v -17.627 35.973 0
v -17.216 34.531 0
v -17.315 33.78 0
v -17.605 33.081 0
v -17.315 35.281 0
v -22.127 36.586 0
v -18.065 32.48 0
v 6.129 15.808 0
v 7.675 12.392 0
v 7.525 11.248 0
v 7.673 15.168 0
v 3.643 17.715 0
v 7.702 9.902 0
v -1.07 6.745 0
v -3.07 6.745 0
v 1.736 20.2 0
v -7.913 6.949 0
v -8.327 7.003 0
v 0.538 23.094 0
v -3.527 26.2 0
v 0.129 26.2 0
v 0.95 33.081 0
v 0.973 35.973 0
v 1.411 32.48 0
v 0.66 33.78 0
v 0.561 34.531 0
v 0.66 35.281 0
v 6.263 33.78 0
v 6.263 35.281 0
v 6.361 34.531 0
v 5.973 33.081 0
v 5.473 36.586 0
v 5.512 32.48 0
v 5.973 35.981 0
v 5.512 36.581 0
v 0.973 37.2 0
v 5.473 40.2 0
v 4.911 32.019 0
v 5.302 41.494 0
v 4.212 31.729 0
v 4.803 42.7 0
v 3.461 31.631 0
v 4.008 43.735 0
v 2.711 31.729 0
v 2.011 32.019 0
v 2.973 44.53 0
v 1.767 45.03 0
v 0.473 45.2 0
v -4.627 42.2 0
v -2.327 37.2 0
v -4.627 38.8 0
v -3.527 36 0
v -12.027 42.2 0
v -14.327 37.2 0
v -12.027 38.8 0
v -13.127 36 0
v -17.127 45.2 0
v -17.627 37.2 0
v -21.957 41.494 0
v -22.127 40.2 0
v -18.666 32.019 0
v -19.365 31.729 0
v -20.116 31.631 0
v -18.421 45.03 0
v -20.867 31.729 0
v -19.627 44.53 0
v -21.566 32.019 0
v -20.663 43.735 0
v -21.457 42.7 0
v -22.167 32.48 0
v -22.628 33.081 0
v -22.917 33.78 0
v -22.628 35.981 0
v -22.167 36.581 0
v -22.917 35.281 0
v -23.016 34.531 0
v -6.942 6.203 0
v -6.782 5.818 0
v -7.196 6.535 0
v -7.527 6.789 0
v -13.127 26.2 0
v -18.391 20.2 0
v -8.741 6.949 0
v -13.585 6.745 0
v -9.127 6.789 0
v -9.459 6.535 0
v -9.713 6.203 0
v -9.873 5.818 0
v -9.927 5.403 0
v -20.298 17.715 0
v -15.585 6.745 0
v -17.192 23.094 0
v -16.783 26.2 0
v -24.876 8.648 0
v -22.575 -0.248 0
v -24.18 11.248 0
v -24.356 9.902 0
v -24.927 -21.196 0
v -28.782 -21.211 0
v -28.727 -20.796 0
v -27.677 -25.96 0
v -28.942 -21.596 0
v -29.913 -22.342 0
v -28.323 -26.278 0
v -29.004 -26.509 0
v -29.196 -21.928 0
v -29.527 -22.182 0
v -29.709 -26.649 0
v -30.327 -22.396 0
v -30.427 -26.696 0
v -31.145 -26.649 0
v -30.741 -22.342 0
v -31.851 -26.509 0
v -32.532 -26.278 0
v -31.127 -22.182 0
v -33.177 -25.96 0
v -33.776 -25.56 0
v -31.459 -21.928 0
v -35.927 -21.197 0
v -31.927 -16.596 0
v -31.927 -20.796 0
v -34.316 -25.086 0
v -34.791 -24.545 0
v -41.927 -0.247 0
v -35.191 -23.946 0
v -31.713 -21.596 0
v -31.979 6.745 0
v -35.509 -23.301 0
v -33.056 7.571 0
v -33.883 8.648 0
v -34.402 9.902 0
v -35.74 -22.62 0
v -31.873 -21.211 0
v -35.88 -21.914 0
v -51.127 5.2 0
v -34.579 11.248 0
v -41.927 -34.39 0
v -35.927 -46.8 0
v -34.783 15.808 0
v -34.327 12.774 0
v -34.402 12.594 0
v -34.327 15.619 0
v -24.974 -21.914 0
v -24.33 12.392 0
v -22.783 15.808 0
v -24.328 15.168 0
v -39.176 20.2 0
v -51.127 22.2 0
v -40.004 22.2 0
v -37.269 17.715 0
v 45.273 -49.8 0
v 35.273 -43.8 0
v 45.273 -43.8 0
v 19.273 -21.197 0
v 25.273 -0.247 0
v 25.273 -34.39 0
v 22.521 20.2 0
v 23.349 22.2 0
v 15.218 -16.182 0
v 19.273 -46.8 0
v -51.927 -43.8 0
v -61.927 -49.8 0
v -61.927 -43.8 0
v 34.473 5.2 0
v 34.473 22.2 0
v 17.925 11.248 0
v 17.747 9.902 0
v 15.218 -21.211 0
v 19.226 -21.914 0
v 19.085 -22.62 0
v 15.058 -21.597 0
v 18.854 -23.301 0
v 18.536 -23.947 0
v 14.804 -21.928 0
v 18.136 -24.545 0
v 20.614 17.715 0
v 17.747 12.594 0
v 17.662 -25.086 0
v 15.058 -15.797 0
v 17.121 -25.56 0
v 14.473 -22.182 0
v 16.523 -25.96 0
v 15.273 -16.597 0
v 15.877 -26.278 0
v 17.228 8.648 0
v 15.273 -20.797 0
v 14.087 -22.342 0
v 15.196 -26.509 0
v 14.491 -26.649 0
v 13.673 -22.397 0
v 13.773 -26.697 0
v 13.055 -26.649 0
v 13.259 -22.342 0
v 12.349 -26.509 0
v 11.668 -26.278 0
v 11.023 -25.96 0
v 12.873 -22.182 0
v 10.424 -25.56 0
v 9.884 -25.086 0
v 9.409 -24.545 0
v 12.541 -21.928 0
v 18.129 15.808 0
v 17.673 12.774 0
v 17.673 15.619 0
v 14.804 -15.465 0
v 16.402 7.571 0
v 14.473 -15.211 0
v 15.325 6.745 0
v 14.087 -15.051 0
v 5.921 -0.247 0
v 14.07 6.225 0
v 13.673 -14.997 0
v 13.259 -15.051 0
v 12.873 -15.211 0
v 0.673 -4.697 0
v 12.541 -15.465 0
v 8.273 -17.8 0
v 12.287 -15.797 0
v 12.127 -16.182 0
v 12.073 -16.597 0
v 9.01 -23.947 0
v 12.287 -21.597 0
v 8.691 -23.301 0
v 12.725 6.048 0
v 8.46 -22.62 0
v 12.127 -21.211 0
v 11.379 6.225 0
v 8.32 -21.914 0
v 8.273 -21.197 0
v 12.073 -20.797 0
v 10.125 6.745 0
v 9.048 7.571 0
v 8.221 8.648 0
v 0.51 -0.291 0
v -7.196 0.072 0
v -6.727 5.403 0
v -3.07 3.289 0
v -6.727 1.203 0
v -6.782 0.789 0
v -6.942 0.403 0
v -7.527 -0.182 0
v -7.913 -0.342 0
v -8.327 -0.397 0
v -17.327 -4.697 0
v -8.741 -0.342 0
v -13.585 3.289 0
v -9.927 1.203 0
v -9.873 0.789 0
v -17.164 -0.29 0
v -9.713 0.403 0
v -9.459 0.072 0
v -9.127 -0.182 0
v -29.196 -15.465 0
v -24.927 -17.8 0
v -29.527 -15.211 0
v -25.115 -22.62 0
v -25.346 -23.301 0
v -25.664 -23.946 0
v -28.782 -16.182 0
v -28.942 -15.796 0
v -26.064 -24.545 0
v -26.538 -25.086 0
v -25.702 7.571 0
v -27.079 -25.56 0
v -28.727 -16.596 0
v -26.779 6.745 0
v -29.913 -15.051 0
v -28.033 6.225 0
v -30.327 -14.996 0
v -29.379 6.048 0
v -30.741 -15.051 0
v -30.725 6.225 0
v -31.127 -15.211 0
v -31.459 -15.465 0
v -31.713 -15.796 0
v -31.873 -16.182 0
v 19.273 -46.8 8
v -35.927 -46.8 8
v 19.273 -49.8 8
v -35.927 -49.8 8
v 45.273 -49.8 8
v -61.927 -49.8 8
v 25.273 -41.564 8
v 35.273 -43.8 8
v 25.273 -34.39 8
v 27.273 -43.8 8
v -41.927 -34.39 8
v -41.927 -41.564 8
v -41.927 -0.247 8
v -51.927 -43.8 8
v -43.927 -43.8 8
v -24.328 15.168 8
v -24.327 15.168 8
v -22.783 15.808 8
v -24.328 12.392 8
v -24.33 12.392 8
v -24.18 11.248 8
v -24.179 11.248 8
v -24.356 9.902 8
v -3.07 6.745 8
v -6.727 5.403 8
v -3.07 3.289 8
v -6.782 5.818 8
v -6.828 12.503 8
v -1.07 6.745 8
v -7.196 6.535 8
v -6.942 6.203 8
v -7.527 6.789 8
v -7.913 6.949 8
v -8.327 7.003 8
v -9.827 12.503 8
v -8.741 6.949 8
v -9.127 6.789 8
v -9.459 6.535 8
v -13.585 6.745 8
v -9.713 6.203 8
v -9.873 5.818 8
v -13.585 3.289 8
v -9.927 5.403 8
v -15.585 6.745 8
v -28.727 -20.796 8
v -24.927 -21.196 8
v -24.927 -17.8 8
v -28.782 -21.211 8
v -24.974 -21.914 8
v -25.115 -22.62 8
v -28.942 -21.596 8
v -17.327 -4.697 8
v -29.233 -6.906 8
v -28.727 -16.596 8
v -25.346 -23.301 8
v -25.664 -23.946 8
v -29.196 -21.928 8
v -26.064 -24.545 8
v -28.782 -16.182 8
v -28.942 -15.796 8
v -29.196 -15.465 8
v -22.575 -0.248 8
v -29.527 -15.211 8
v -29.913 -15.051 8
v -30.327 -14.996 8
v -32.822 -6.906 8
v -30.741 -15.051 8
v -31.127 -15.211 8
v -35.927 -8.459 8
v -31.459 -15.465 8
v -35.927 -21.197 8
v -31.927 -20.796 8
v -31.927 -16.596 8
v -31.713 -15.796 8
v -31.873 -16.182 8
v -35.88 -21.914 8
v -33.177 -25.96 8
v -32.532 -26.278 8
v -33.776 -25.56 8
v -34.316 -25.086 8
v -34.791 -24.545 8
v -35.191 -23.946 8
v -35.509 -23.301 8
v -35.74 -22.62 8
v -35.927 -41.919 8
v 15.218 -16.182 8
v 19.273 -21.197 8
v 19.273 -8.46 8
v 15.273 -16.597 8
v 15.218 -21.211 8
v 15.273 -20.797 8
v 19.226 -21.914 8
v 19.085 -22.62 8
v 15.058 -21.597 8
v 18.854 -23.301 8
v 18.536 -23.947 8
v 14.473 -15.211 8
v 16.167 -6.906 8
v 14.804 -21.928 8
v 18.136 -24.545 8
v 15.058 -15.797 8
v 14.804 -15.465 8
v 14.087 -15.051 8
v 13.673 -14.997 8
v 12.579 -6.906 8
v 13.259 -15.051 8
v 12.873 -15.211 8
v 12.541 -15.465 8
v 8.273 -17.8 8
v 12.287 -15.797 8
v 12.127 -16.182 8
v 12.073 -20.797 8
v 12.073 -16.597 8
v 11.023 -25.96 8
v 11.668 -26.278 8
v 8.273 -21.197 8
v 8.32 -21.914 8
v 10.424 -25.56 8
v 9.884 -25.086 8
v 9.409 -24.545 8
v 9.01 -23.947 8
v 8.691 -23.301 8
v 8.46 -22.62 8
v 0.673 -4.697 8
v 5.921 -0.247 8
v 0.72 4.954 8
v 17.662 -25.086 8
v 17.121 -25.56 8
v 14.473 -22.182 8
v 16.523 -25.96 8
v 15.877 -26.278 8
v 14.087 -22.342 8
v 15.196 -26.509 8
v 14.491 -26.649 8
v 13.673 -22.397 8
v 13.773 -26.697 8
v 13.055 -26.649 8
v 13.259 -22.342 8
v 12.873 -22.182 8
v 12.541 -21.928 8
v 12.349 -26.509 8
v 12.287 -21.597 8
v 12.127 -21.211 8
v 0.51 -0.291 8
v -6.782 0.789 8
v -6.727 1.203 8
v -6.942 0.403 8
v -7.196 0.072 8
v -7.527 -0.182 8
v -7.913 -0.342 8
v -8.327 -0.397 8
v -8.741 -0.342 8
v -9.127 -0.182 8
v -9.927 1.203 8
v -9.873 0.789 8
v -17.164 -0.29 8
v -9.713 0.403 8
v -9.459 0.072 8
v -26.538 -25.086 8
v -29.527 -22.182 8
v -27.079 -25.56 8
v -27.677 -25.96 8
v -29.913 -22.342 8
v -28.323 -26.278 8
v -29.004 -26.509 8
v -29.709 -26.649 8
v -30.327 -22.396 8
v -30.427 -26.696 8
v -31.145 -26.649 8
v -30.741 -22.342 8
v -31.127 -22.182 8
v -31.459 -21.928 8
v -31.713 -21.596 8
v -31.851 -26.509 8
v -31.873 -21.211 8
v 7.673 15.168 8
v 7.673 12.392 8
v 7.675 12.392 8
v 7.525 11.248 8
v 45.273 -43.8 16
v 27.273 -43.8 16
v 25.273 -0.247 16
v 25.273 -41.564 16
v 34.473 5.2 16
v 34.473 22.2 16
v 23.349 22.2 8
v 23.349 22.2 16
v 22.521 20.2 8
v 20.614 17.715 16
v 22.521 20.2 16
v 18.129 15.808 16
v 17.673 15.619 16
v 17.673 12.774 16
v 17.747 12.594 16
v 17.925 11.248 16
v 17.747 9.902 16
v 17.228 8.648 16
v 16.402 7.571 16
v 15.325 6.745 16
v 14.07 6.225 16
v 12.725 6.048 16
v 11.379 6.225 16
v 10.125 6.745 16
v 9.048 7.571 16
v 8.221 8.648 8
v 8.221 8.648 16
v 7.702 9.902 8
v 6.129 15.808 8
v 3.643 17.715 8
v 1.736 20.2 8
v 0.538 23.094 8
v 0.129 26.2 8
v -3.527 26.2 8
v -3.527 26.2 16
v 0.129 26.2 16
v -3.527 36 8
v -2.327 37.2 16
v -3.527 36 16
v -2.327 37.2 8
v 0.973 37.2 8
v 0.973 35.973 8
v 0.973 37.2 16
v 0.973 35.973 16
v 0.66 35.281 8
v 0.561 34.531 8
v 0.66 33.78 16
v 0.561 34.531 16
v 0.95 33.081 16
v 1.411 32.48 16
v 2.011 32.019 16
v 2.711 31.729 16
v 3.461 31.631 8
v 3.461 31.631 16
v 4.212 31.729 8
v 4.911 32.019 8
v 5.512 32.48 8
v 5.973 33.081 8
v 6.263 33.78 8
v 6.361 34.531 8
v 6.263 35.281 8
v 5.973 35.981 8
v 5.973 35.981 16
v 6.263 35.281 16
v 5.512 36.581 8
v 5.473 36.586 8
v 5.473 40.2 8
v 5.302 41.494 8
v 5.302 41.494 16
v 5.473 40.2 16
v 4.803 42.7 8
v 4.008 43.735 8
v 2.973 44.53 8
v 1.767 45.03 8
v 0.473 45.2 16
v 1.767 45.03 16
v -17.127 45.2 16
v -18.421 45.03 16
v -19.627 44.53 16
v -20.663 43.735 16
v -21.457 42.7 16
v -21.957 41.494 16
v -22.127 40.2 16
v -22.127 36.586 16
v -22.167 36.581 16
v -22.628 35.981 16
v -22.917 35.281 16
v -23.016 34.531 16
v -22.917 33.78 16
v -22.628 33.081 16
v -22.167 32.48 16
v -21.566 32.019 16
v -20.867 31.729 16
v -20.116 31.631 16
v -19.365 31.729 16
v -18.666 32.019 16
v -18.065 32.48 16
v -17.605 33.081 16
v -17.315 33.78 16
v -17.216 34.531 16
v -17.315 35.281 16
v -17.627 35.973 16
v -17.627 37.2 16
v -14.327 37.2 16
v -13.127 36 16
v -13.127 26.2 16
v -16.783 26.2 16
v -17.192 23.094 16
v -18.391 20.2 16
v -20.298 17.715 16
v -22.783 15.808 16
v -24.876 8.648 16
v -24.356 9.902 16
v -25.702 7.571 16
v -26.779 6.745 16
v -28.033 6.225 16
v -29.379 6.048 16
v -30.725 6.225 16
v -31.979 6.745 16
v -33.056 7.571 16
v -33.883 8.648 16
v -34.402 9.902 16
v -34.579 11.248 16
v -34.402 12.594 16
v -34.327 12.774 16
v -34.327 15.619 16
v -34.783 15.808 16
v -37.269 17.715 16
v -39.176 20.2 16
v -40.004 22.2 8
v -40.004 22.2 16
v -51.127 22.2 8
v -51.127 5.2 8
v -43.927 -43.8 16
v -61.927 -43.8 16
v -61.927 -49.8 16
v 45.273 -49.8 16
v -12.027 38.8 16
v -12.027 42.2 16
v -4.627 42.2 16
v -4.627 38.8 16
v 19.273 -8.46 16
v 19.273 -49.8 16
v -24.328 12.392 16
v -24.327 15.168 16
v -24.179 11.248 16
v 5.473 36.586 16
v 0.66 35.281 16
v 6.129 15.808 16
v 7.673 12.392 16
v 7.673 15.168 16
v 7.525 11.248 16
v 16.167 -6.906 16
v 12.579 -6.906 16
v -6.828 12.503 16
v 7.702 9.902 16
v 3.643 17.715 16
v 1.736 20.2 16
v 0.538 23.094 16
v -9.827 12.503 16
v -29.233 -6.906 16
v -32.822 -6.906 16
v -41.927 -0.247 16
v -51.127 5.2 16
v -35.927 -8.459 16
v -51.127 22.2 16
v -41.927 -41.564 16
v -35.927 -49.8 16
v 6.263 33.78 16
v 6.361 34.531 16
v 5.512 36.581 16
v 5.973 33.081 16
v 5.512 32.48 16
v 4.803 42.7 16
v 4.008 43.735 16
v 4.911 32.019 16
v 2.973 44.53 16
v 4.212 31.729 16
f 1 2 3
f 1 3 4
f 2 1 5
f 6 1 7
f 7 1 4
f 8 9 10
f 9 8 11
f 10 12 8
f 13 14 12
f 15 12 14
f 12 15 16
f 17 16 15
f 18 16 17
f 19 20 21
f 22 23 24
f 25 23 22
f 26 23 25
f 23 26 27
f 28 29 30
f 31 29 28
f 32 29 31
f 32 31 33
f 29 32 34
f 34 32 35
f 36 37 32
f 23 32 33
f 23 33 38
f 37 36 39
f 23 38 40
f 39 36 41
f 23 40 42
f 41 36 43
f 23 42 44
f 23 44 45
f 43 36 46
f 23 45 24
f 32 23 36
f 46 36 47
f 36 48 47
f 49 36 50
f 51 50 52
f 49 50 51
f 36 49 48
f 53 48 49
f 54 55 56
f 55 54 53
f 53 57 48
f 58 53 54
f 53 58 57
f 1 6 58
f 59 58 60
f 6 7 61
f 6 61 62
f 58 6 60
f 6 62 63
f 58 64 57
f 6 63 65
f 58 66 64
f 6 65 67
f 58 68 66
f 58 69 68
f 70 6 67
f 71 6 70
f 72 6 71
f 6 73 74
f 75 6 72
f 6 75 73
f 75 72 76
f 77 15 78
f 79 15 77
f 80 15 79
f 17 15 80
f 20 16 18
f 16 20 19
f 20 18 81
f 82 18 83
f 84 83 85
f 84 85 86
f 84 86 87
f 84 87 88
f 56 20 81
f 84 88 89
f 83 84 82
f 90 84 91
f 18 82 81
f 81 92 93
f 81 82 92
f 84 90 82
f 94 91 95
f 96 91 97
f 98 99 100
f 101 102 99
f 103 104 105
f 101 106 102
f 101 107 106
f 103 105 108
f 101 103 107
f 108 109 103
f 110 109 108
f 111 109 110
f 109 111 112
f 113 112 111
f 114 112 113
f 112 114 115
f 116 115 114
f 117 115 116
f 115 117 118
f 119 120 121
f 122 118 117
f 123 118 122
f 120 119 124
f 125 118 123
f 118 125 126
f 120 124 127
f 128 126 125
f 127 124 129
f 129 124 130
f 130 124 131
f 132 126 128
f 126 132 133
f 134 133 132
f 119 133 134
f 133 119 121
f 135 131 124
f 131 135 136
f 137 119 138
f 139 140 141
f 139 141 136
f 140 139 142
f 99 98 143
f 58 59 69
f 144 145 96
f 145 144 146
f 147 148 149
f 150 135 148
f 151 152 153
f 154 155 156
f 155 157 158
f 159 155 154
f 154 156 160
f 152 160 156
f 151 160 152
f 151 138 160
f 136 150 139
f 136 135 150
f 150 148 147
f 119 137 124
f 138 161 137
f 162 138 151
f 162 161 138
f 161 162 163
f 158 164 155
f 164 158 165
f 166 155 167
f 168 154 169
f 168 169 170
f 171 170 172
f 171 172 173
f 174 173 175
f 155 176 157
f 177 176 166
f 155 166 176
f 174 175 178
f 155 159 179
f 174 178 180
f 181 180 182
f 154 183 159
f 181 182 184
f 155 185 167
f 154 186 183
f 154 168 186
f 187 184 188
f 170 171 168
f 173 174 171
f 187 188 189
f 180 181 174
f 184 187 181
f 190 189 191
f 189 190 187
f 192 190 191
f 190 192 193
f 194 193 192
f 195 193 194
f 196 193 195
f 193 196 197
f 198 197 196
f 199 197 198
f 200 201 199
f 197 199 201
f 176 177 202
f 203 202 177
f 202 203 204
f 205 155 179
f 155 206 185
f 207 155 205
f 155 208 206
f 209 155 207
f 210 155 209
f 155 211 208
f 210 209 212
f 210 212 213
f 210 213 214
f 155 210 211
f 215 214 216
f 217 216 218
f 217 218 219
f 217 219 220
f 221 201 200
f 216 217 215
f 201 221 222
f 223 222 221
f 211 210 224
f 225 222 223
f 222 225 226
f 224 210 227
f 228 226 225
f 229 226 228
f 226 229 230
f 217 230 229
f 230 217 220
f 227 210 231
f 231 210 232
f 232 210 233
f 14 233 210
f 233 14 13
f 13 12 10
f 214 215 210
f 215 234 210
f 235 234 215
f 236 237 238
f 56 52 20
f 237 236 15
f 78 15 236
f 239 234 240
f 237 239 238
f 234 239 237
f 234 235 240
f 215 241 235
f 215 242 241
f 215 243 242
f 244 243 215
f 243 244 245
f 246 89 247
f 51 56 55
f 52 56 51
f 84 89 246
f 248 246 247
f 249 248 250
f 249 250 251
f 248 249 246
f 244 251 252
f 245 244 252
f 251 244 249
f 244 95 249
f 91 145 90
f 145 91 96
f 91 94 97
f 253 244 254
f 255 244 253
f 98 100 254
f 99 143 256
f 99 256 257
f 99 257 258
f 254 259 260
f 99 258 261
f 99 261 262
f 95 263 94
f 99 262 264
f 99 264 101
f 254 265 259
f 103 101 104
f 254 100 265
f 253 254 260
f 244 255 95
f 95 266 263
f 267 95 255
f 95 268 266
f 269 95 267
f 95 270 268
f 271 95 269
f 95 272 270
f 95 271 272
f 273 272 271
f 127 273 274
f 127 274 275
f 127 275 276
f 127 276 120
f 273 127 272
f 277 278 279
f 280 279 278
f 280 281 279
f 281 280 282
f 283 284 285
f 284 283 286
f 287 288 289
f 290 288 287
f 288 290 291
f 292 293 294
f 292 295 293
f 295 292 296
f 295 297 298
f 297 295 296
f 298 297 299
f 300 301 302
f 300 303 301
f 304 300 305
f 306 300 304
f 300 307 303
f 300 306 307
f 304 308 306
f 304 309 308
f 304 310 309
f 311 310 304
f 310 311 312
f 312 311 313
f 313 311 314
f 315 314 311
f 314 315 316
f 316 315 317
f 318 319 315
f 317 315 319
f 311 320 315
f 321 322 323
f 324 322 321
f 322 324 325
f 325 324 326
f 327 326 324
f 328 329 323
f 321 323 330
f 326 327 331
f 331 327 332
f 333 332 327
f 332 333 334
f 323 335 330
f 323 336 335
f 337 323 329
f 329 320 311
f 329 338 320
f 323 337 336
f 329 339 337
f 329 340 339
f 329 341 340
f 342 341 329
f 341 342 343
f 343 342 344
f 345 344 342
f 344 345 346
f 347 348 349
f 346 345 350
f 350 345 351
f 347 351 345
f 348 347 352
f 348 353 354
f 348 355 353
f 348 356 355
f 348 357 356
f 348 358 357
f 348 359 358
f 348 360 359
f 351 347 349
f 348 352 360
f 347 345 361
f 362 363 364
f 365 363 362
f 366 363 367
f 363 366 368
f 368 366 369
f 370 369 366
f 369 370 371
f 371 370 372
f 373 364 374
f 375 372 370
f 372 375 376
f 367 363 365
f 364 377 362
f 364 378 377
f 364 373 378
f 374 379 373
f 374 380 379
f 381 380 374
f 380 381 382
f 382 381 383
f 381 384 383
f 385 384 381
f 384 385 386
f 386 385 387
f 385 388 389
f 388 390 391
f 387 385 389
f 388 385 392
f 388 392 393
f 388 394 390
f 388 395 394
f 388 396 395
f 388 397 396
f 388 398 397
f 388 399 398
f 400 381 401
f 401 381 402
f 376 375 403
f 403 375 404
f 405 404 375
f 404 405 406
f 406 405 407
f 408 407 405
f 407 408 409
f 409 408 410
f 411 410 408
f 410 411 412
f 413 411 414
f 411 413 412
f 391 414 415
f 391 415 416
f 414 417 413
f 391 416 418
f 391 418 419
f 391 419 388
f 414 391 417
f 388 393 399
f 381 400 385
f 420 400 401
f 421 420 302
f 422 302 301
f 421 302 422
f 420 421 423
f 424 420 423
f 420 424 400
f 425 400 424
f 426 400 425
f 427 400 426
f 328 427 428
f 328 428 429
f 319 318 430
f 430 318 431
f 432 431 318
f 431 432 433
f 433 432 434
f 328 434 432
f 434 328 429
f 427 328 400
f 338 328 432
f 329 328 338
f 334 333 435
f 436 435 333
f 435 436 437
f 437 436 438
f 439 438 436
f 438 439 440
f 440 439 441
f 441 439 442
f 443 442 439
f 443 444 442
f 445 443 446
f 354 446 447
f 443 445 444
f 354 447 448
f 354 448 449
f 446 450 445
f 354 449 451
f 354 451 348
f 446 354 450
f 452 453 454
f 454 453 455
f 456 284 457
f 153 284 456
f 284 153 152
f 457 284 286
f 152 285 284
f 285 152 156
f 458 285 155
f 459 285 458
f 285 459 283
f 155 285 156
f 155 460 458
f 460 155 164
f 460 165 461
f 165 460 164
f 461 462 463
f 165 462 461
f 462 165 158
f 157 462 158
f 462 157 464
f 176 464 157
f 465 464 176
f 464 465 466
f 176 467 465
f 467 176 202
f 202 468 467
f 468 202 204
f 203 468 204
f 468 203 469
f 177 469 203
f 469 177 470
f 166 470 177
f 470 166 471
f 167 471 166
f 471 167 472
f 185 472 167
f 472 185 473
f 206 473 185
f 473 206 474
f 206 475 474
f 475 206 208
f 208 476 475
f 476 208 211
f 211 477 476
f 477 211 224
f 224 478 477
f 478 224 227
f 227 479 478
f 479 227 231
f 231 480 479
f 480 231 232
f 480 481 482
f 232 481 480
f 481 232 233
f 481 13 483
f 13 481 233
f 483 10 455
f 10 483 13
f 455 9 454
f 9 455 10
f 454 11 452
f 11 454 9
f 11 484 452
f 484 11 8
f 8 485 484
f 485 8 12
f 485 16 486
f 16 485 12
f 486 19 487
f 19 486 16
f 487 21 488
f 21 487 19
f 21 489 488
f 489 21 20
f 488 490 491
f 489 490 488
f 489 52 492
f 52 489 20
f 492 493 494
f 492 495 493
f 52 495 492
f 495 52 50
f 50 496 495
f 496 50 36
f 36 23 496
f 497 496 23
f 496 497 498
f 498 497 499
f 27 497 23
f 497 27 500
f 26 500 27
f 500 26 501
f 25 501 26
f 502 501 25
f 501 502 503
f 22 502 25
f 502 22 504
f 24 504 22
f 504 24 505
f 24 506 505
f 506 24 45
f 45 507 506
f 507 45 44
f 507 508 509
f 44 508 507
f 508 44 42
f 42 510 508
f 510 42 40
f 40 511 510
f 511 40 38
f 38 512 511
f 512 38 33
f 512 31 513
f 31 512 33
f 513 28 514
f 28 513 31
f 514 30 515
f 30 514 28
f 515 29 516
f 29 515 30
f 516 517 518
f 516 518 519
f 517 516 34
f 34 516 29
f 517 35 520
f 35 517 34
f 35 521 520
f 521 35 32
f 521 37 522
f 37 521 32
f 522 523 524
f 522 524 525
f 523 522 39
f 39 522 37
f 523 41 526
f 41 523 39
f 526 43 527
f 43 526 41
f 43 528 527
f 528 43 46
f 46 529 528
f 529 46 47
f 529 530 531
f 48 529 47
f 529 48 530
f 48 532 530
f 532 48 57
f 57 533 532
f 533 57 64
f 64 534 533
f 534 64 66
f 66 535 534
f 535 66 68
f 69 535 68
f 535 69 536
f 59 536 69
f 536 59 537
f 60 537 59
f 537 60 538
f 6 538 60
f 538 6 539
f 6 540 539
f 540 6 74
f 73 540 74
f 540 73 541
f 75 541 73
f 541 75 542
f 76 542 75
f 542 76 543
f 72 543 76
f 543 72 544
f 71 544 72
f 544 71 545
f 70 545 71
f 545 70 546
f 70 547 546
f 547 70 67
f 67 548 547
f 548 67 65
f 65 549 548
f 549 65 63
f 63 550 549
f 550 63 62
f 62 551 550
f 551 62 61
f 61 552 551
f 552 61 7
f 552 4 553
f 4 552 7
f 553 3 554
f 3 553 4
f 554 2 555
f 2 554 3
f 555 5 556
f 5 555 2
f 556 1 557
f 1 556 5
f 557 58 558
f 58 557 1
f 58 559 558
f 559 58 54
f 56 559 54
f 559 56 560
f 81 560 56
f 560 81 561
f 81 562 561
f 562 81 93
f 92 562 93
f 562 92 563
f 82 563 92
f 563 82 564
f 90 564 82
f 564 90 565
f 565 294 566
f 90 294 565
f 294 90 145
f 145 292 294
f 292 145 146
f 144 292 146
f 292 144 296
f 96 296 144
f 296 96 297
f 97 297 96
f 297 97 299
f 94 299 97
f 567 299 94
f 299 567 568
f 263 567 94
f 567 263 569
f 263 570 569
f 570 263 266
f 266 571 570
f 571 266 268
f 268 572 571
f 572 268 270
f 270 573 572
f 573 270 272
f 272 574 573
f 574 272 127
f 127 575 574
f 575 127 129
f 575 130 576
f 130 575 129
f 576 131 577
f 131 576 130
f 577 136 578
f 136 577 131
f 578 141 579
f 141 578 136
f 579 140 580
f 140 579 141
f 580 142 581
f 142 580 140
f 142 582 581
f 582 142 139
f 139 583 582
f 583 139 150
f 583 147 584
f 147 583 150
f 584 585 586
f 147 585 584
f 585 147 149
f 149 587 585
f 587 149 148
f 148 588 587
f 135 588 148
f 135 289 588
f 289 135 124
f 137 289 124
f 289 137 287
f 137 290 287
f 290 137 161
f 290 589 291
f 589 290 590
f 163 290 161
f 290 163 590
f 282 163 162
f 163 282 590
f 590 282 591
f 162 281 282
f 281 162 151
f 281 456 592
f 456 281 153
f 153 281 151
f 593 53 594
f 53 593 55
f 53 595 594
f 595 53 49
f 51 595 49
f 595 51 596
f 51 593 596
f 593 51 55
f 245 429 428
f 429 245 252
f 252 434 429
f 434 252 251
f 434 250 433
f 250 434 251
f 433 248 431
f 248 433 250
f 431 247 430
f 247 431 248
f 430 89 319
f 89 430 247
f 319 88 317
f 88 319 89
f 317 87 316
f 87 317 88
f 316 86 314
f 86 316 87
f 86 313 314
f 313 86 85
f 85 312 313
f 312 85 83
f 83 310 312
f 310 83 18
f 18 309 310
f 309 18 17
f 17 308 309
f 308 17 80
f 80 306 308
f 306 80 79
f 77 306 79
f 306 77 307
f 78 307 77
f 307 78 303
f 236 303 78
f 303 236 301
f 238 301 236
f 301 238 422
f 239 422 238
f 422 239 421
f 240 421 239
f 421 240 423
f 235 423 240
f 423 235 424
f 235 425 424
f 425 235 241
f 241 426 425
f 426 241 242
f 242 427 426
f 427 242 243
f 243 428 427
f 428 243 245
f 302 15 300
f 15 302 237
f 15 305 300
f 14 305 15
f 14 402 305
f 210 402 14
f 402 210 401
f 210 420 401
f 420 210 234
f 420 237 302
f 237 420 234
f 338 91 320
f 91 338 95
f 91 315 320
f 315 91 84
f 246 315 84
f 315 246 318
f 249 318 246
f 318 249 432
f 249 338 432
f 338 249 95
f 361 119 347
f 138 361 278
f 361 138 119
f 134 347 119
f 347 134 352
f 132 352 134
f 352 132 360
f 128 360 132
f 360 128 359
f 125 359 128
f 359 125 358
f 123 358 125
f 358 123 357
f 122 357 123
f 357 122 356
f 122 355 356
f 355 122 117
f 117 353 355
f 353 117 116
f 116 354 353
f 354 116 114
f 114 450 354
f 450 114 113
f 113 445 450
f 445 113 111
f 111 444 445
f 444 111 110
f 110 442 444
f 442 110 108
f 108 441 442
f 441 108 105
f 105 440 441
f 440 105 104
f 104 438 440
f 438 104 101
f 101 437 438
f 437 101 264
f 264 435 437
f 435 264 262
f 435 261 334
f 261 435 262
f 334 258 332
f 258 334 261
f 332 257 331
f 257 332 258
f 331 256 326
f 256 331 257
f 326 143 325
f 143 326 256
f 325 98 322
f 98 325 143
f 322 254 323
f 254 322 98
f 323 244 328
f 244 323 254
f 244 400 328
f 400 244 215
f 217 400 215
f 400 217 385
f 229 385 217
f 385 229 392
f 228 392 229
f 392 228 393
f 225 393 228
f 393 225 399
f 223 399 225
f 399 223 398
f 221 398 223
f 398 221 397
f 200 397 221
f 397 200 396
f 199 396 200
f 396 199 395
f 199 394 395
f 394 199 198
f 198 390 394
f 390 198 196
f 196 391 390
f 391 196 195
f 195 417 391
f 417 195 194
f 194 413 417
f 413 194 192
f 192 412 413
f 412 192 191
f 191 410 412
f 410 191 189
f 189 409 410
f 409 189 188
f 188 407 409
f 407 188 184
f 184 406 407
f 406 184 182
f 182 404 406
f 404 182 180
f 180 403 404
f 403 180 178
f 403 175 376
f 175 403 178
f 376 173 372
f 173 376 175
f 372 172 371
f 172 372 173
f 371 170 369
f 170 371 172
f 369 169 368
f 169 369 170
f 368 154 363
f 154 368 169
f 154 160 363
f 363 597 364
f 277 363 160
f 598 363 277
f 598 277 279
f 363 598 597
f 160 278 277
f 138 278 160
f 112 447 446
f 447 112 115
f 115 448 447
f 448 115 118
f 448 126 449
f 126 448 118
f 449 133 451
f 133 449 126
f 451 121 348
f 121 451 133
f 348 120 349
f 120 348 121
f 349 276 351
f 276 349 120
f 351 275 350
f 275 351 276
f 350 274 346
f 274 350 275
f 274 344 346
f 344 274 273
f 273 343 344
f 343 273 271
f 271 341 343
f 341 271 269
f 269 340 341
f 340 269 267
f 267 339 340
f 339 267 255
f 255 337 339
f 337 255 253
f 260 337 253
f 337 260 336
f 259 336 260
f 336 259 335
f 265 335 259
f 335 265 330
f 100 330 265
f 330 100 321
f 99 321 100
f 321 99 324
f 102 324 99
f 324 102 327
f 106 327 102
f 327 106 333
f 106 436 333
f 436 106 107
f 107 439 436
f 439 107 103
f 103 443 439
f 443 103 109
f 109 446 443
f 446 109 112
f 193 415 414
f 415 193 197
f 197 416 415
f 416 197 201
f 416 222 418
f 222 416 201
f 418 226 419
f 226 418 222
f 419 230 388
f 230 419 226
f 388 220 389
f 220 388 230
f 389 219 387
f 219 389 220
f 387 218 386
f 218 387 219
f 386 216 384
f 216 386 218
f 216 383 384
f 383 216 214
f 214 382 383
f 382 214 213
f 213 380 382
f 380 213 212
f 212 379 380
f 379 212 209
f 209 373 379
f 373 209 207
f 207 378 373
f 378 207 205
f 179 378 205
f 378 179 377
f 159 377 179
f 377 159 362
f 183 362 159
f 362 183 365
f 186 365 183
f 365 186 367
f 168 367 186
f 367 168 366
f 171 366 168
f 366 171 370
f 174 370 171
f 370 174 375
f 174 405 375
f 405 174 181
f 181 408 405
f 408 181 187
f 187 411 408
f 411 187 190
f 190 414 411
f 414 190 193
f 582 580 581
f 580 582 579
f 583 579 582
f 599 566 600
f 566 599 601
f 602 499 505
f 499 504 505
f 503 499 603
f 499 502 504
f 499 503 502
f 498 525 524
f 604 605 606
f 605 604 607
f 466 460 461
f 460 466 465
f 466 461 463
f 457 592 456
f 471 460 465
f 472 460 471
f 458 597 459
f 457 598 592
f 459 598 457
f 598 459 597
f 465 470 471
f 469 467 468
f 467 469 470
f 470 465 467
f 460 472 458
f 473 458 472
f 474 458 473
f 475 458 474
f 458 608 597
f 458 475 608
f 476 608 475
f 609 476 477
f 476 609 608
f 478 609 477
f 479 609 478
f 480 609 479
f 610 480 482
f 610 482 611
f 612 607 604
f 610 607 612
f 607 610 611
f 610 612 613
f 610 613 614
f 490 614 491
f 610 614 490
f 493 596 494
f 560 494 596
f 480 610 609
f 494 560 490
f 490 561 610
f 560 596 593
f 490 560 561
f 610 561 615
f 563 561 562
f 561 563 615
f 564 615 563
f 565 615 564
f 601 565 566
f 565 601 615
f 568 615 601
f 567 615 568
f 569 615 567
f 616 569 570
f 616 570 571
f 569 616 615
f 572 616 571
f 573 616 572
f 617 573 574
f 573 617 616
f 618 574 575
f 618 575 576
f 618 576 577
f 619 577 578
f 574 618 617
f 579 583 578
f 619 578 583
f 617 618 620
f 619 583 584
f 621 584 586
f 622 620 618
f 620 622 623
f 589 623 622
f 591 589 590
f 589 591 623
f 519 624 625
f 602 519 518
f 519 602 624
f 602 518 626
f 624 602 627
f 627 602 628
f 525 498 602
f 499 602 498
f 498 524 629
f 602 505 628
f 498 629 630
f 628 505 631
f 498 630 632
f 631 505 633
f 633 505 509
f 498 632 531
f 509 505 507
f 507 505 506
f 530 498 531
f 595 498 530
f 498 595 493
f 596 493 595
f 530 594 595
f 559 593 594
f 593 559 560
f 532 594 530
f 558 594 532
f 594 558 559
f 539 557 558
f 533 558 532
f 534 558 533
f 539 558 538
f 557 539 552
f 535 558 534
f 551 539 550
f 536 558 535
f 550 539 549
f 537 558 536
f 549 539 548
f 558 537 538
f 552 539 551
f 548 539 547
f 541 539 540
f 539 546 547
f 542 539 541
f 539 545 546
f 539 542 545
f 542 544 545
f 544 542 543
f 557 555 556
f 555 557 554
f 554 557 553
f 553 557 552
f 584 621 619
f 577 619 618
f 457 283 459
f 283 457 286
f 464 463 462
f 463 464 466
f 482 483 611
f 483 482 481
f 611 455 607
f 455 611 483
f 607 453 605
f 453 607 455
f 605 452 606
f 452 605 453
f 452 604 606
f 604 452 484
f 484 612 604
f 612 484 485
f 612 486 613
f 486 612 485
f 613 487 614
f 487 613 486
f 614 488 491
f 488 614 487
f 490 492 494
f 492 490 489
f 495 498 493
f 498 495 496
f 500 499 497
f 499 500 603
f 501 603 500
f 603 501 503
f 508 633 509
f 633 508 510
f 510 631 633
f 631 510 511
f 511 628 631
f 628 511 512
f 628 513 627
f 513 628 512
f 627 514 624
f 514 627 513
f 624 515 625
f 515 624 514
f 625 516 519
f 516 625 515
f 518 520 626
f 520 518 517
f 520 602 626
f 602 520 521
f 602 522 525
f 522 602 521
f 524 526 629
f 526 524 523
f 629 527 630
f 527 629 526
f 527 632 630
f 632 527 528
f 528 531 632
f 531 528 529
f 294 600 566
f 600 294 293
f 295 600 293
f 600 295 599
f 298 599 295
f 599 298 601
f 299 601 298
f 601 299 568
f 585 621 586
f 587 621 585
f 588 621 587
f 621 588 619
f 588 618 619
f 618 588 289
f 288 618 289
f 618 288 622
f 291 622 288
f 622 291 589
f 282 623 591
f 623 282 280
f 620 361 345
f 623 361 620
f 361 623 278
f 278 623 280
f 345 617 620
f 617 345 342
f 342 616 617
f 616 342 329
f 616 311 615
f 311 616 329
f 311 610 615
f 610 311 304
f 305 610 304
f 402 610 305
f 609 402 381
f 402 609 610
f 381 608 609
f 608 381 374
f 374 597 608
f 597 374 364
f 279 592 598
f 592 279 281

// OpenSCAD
// Fullish HST double-bolt Bowden extruder V4 assembly / mounting bracket
// Written by Kevin Cole <kjcole@member.fsf.org> 2017.08.18

// A combination of bottom.scad and top.scad to reproduce (sort of)
// the original STL. See instructions at:


union() {
  // Bottom
  linear_extrude(height=8) {
    difference() {
      polygon([[-34.4021,12.5938],
               [-34.5793,11.248],
               [-34.4021,9.90213],
               [-33.8827,8.64798],
               [-33.0563,7.57103],
               [-31.9793,6.74466],
               [-30.7252,6.22517],
               [-29.3793,6.04797],
               [-28.0335,6.22516],
               [-26.7793,6.74464],
               [-25.7024,7.57101],
               [-24.876,8.64798],
               [-24.3565,9.90211],
               [-24.1798,11.2479],
               [-24.33,12.3922],
               [-24.3276,15.1682],
               [-22.7834,15.8077],
               [-20.2981,17.7147],
               [-18.3911,20.2],
               [-17.1923,23.0941],
               [-16.7834,26.2],
               [-13.1273,26.2],
               [-13.1273,36],
               [-14.3273,37.2],
               [-17.6273,37.2],
               [-17.6273,35.9732],
               [-17.3149,35.2811],
               [-17.2161,34.5306],
               [-17.3149,33.78],
               [-17.6046,33.0806],
               [-18.0655,32.48],
               [-18.6661,32.0191],
               [-19.3655,31.7294],
               [-20.1161,31.6306],
               [-20.8667,31.7294],
               [-21.5661,32.0191],
               [-22.1667,32.48],
               [-22.6276,33.0806],
               [-22.9173,33.78],
               [-23.0161,34.5306],
               [-22.9173,35.2812],
               [-22.6276,35.9806],
               [-22.1667,36.5812],
               [-22.1273,36.586],
               [-22.1273,40.2],
               [-21.957,41.494],
               [-21.4574,42.7],
               [-20.6629,43.7355],
               [-19.6273,44.5301],
               [-18.4214,45.0296],
               [-17.1273,45.2],
               [0.472641,45.1999],
               [1.76675,45.0296],
               [2.97266,44.5301],
               [4.00818,43.7355],
               [4.80278,42.6999],
               [5.30228,41.494],
               [5.47263,40.1999],
               [5.47267,36.586],
               [5.51204,36.5812],
               [5.9729,35.9806],
               [6.2626,35.2811],
               [6.36142,34.5306],
               [6.2626,33.78],
               [5.97289,33.0806],
               [5.51204,32.4799],
               [4.91142,32.0191],
               [4.21201,31.7294],
               [3.4614,31.6306],
               [2.71083,31.7294],
               [2.0114,32.0191],
               [1.41078,32.4799],
               [0.949921,33.0806],
               [0.660217,33.78],
               [0.561401,34.5306],
               [0.660217,35.2811],
               [0.972641,35.9732],
               [0.972641,37.1999],
               [-2.32733,37.2],
               [-3.52737,36],
               [-3.52731,26.2],
               [0.128723,26.2],
               [0.537628,23.0941],
               [1.73642,20.2],
               [3.64345,17.7147],
               [6.12872,15.8077],
               [7.67294,15.1682],
               [7.67528,12.3922],
               [7.52464,11.248],
               [7.70183,9.9021],
               [8.22131,8.64795],
               [9.04768,7.571],
               [10.1246,6.74463],
               [11.3788,6.22514],
               [12.7246,6.04796],
               [14.0705,6.22514],
               [15.3246,6.74463],
               [16.4016,7.571],
               [17.228,8.64795],
               [17.7474,9.9021],
               [17.9246,11.248],
               [17.7474,12.5938],
               [17.6726,12.7744],
               [17.6726,15.6187],
               [18.1287,15.8077],
               [20.614,17.7147],
               [22.521,20.2],
               [23.3495,22.2],
               [34.4727,22.2],
               [34.4727,5.20003],
               [25.2727,-0.247314],
               [25.2727,-34.3899],
               [35.2727,-43.8],
               [45.2727,-43.8],
               [45.2727,-49.8],
               [-61.9275,-49.7999],
               [-61.9275,-43.7999],
               [-51.9275,-43.7999],
               [-41.9275,-34.3899],
               [-41.9274,-0.24733],
               [-51.1274,5.20007],
               [-51.1273,22.2001],
               [-40.0041,22.2],
               [-39.1757,20.2],
               [-37.2687,17.7147],
               [-34.7834,15.8077],
               [-34.3273,15.6188],
               [-34.3273,12.7745]]);

      polygon([[14.4906,-26.6495],
               [13.7727,-26.6966],
               [13.0548,-26.6495],
               [12.3492,-26.5092],
               [11.6679,-26.2779],
               [11.0227,-25.9597],
               [10.4245,-25.56],
               [9.88359,-25.0856],
               [9.40924,-24.5448],
               [9.00954,-23.9466],
               [8.69135,-23.3013],
               [8.46008,-22.6201],
               [8.31973,-21.9145],
               [8.27267,-21.1966],
               [8.27267,-17.7999],
               [0.672684,-4.69656],
               [-17.3274,-4.69655],
               [-24.9274,-17.7999],
               [-24.9274,-21.1965],
               [-24.9745,-21.9144],
               [-25.1148,-22.6201],
               [-25.3461,-23.3013],
               [-25.6643,-23.9465],
               [-26.064,-24.5447],
               [-26.5383,-25.0856],
               [-27.0792,-25.56],
               [-27.6774,-25.9597],
               [-28.3227,-26.2779],
               [-29.0039,-26.5091],
               [-29.7095,-26.6495],
               [-30.4274,-26.6965],
               [-31.1453,-26.6495],
               [-31.8509,-26.5091],
               [-32.5322,-26.2779],
               [-33.1774,-25.9597],
               [-33.7756,-25.56],
               [-34.3165,-25.0856],
               [-34.7909,-24.5447],
               [-35.1906,-23.9465],
               [-35.5088,-23.3013],
               [-35.74,-22.62],
               [-35.8804,-21.9144],
               [-35.9274,-21.1966],
               [-35.9275,-46.7999],
               [19.2727,-46.7999],
               [19.2727,-21.1966],
               [19.2256,-21.9145],
               [19.0853,-22.6201],
               [18.854,-23.3013],
               [18.5358,-23.9466],
               [18.1361,-24.5448],
               [17.6618,-25.0856],
               [17.1209,-25.56],
               [16.5227,-25.9597],
               [15.8774,-26.2779],
               [15.1962,-26.5092]]);

      polygon([[13.2586,-15.0511],
               [12.8727,-15.2109],
               [12.5413,-15.4652],
               [12.287,-15.7966],
               [12.1272,-16.1824],
               [12.0727,-16.5966],
               [12.0727,-20.7966],
               [12.1272,-21.2107],
               [12.287,-21.5966],
               [12.5413,-21.9279],
               [12.8727,-22.1822],
               [13.2586,-22.342],
               [13.6727,-22.3966],
               [14.0868,-22.342],
               [14.4727,-22.1822],
               [14.804,-21.9279],
               [15.0583,-21.5966],
               [15.2182,-21.2107],
               [15.2727,-20.7966],
               [15.2727,-16.5966],
               [15.2182,-16.1824],
               [15.0583,-15.7966],
               [14.804,-15.4652],
               [14.4727,-15.2109],
               [14.0868,-15.0511],
               [13.6727,-14.9966]]);

      polygon([[-30.7415,-15.0511],
               [-31.1274,-15.2109],
               [-31.4588,-15.4652],
               [-31.713,-15.7965],
               [-31.8729,-16.1824],
               [-31.9274,-16.5965],
               [-31.9274,-20.7965],
               [-31.8729,-21.2106],
               [-31.7131,-21.5965],
               [-31.4588,-21.9279],
               [-31.1274,-22.1822],
               [-30.7415,-22.342],
               [-30.3274,-22.3965],
               [-29.9133,-22.342],
               [-29.5274,-22.1822],
               [-29.196,-21.9279],
               [-28.9418,-21.5965],
               [-28.7819,-21.2106],
               [-28.7274,-20.7965],
               [-28.7274,-16.5965],
               [-28.7819,-16.1824],
               [-28.9418,-15.7965],
               [-29.196,-15.4652],
               [-29.5274,-15.2109],
               [-29.9133,-15.0511],
               [-30.3274,-14.9965]]);

      polygon([[-8.74149,6.9489],
               [-9.12738,6.78906],
               [-9.45876,6.53479],
               [-9.71303,6.20343],
               [-9.87286,5.81754],
               [-9.92738,5.40343],
               [-9.92738,1.20343],
               [-9.87286,0.789307],
               [-9.71303,0.403427],
               [-9.45876,0.072052],
               [-9.1274,-0.182205],
               [-8.7415,-0.342041],
               [-8.32738,-0.396561],
               [-7.91319,-0.342041],
               [-7.5273,-0.182205],
               [-7.19594,0.072052],
               [-6.94167,0.403427],
               [-6.78183,0.789307],
               [-6.72731,1.20341],
               [-6.72731,5.40343],
               [-6.78183,5.81754],
               [-6.94167,6.20341],
               [-7.19594,6.53479],
               [-7.5273,6.78906],
               [-7.91319,6.9489],
               [-8.32738,7.00342]]);

      polygon([[-3.06958,3.28932],
               [0.510025,-0.290726],
               [5.92073,-0.247345],
               [-1.06979,6.74452],
               [-3.06958,6.74461]]);

      polygon([[-15.5847,6.74461],
               [-22.5753,-0.247528],
               [-17.164,-0.29039],
               [-13.5847,3.28934],
               [-13.5847,6.74461]]);

      polygon([[-12.0274,42.1999],
               [-12.0274,38.7999],
               [-4.6273,38.7999],
               [-4.6273,42.1999]]);
    }
  }
  // Top
  translate([0, 0, 8]) {
    linear_extrude(height=8) {
      difference() {
        polygon([[3.64343,17.7147],
                 [6.12871,15.8077],
                 [7.6727,15.1682],
                 [7.67308,12.3922],
                 [7.52463,11.248],
                 [7.70181,9.9021],
                 [8.2213,8.64795],
                 [9.04767,7.571],
                 [10.1246,6.74463],
                 [11.3788,6.22514],
                 [12.7246,6.04796],
                 [14.0705,6.22514],
                 [15.3246,6.74463],
                 [16.4016,7.571],
                 [17.228,8.64795],
                 [17.7474,9.9021],
                 [17.9246,11.248],
                 [17.7474,12.5938],
                 [17.6726,12.7744],
                 [17.6726,15.6187],
                 [18.1287,15.8077],
                 [20.614,17.7147],
                 [22.521,20.2],
                 [23.3494,22.2],
                 [34.4727,22.2],
                 [34.4727,5.20003],
                 [25.2727,-0.247314],
                 [25.2727,-41.5641],
                 [27.2727,-43.8],
                 [45.2727,-43.8],
                 [45.2727,-49.8],
                 [19.2727,-49.7999],
                 [19.2727,-8.45967],
                 [16.1668,-6.90642],
                 [12.5786,-6.90642],
                 [-6.82761,12.5034],
                 [-9.82709,12.5034],
                 [-29.2331,-6.90619],
                 [-32.8217,-6.90619],
                 [-35.9274,-8.45934],
                 [-35.9275,-49.7999],
                 [-61.9275,-49.7999],
                 [-61.9275,-43.7999],
                 [-43.9275,-43.7999],
                 [-41.9275,-41.5641],
                 [-41.9274,-0.247314],
                 [-51.1274,5.20009],
                 [-51.1274,22.2],
                 [-40.0041,22.2],
                 [-39.1757,20.2],
                 [-37.2687,17.7147],
                 [-34.7834,15.8077],
                 [-34.3273,15.6188],
                 [-34.3273,12.7745],
                 [-34.4021,12.5938],
                 [-34.5793,11.248],
                 [-34.4021,9.90213],
                 [-33.8827,8.64798],
                 [-33.0563,7.57103],
                 [-31.9793,6.74466],
                 [-30.7252,6.22517],
                 [-29.3793,6.04797],
                 [-28.0335,6.22516],
                 [-26.7793,6.74464],
                 [-25.7024,7.57101],
                 [-24.876,8.64798],
                 [-24.3565,9.90211],
                 [-24.1793,11.248],
                 [-24.3278,12.3922],
                 [-24.3274,15.1682],
                 [-22.7834,15.8077],
                 [-20.2981,17.7147],
                 [-18.3911,20.2],
                 [-17.1923,23.0941],
                 [-16.7834,26.2],
                 [-13.1273,26.2],
                 [-13.1273,36],
                 [-14.3273,37.2],
                 [-17.6273,37.2],
                 [-17.6273,35.9732],
                 [-17.3149,35.2811],
                 [-17.2161,34.5306],
                 [-17.3149,33.78],
                 [-17.6046,33.0806],
                 [-18.0655,32.48],
                 [-18.6661,32.0191],
                 [-19.3655,31.7294],
                 [-20.1161,31.6306],
                 [-20.8667,31.7294],
                 [-21.5661,32.0191],
                 [-22.1667,32.48],
                 [-22.6276,33.0806],
                 [-22.9173,33.78],
                 [-23.0161,34.5306],
                 [-22.9173,35.2812],
                 [-22.6276,35.9806],
                 [-22.1667,36.5812],
                 [-22.1273,36.586],
                 [-22.1273,40.2],
                 [-21.957,41.494],
                 [-21.4574,42.7],
                 [-20.6629,43.7355],
                 [-19.6273,44.5301],
                 [-18.4214,45.0296],
                 [-17.1273,45.2],
                 [0.472641,45.1999],
                 [1.76674,45.0296],
                 [2.97264,44.5301],
                 [4.00818,43.7355],
                 [4.80276,42.6999],
                 [5.30228,41.494],
                 [5.47263,40.1999],
                 [5.47264,36.586],
                 [5.51201,36.5812],
                 [5.97289,35.9806],
                 [6.26259,35.2811],
                 [6.3614,34.5306],
                 [6.26259,33.78],
                 [5.97287,33.0806],
                 [5.51201,32.4799],
                 [4.91141,32.0191],
                 [4.21198,31.7294],
                 [3.4614,31.6306],
                 [2.71083,31.7294],
                 [2.0114,32.0191],
                 [1.41078,32.4799],
                 [0.949921,33.0806],
                 [0.660217,33.78],
                 [0.561401,34.5306],
                 [0.660217,35.2812],
                 [0.972641,35.9732],
                 [0.972641,37.2],
                 [-2.32733,37.2],
                 [-3.52737,36],
                 [-3.52733,26.2],
                 [0.128708,26.2],
                 [0.537598,23.0941],
                 [1.7364,20.2]]);
  
        polygon([[-12.0274,42.1999],
                 [-12.0274,38.7999],
                 [-4.6273,38.7999],
                 [-4.6273,42.1999]]);
      }
    }
  }
}
